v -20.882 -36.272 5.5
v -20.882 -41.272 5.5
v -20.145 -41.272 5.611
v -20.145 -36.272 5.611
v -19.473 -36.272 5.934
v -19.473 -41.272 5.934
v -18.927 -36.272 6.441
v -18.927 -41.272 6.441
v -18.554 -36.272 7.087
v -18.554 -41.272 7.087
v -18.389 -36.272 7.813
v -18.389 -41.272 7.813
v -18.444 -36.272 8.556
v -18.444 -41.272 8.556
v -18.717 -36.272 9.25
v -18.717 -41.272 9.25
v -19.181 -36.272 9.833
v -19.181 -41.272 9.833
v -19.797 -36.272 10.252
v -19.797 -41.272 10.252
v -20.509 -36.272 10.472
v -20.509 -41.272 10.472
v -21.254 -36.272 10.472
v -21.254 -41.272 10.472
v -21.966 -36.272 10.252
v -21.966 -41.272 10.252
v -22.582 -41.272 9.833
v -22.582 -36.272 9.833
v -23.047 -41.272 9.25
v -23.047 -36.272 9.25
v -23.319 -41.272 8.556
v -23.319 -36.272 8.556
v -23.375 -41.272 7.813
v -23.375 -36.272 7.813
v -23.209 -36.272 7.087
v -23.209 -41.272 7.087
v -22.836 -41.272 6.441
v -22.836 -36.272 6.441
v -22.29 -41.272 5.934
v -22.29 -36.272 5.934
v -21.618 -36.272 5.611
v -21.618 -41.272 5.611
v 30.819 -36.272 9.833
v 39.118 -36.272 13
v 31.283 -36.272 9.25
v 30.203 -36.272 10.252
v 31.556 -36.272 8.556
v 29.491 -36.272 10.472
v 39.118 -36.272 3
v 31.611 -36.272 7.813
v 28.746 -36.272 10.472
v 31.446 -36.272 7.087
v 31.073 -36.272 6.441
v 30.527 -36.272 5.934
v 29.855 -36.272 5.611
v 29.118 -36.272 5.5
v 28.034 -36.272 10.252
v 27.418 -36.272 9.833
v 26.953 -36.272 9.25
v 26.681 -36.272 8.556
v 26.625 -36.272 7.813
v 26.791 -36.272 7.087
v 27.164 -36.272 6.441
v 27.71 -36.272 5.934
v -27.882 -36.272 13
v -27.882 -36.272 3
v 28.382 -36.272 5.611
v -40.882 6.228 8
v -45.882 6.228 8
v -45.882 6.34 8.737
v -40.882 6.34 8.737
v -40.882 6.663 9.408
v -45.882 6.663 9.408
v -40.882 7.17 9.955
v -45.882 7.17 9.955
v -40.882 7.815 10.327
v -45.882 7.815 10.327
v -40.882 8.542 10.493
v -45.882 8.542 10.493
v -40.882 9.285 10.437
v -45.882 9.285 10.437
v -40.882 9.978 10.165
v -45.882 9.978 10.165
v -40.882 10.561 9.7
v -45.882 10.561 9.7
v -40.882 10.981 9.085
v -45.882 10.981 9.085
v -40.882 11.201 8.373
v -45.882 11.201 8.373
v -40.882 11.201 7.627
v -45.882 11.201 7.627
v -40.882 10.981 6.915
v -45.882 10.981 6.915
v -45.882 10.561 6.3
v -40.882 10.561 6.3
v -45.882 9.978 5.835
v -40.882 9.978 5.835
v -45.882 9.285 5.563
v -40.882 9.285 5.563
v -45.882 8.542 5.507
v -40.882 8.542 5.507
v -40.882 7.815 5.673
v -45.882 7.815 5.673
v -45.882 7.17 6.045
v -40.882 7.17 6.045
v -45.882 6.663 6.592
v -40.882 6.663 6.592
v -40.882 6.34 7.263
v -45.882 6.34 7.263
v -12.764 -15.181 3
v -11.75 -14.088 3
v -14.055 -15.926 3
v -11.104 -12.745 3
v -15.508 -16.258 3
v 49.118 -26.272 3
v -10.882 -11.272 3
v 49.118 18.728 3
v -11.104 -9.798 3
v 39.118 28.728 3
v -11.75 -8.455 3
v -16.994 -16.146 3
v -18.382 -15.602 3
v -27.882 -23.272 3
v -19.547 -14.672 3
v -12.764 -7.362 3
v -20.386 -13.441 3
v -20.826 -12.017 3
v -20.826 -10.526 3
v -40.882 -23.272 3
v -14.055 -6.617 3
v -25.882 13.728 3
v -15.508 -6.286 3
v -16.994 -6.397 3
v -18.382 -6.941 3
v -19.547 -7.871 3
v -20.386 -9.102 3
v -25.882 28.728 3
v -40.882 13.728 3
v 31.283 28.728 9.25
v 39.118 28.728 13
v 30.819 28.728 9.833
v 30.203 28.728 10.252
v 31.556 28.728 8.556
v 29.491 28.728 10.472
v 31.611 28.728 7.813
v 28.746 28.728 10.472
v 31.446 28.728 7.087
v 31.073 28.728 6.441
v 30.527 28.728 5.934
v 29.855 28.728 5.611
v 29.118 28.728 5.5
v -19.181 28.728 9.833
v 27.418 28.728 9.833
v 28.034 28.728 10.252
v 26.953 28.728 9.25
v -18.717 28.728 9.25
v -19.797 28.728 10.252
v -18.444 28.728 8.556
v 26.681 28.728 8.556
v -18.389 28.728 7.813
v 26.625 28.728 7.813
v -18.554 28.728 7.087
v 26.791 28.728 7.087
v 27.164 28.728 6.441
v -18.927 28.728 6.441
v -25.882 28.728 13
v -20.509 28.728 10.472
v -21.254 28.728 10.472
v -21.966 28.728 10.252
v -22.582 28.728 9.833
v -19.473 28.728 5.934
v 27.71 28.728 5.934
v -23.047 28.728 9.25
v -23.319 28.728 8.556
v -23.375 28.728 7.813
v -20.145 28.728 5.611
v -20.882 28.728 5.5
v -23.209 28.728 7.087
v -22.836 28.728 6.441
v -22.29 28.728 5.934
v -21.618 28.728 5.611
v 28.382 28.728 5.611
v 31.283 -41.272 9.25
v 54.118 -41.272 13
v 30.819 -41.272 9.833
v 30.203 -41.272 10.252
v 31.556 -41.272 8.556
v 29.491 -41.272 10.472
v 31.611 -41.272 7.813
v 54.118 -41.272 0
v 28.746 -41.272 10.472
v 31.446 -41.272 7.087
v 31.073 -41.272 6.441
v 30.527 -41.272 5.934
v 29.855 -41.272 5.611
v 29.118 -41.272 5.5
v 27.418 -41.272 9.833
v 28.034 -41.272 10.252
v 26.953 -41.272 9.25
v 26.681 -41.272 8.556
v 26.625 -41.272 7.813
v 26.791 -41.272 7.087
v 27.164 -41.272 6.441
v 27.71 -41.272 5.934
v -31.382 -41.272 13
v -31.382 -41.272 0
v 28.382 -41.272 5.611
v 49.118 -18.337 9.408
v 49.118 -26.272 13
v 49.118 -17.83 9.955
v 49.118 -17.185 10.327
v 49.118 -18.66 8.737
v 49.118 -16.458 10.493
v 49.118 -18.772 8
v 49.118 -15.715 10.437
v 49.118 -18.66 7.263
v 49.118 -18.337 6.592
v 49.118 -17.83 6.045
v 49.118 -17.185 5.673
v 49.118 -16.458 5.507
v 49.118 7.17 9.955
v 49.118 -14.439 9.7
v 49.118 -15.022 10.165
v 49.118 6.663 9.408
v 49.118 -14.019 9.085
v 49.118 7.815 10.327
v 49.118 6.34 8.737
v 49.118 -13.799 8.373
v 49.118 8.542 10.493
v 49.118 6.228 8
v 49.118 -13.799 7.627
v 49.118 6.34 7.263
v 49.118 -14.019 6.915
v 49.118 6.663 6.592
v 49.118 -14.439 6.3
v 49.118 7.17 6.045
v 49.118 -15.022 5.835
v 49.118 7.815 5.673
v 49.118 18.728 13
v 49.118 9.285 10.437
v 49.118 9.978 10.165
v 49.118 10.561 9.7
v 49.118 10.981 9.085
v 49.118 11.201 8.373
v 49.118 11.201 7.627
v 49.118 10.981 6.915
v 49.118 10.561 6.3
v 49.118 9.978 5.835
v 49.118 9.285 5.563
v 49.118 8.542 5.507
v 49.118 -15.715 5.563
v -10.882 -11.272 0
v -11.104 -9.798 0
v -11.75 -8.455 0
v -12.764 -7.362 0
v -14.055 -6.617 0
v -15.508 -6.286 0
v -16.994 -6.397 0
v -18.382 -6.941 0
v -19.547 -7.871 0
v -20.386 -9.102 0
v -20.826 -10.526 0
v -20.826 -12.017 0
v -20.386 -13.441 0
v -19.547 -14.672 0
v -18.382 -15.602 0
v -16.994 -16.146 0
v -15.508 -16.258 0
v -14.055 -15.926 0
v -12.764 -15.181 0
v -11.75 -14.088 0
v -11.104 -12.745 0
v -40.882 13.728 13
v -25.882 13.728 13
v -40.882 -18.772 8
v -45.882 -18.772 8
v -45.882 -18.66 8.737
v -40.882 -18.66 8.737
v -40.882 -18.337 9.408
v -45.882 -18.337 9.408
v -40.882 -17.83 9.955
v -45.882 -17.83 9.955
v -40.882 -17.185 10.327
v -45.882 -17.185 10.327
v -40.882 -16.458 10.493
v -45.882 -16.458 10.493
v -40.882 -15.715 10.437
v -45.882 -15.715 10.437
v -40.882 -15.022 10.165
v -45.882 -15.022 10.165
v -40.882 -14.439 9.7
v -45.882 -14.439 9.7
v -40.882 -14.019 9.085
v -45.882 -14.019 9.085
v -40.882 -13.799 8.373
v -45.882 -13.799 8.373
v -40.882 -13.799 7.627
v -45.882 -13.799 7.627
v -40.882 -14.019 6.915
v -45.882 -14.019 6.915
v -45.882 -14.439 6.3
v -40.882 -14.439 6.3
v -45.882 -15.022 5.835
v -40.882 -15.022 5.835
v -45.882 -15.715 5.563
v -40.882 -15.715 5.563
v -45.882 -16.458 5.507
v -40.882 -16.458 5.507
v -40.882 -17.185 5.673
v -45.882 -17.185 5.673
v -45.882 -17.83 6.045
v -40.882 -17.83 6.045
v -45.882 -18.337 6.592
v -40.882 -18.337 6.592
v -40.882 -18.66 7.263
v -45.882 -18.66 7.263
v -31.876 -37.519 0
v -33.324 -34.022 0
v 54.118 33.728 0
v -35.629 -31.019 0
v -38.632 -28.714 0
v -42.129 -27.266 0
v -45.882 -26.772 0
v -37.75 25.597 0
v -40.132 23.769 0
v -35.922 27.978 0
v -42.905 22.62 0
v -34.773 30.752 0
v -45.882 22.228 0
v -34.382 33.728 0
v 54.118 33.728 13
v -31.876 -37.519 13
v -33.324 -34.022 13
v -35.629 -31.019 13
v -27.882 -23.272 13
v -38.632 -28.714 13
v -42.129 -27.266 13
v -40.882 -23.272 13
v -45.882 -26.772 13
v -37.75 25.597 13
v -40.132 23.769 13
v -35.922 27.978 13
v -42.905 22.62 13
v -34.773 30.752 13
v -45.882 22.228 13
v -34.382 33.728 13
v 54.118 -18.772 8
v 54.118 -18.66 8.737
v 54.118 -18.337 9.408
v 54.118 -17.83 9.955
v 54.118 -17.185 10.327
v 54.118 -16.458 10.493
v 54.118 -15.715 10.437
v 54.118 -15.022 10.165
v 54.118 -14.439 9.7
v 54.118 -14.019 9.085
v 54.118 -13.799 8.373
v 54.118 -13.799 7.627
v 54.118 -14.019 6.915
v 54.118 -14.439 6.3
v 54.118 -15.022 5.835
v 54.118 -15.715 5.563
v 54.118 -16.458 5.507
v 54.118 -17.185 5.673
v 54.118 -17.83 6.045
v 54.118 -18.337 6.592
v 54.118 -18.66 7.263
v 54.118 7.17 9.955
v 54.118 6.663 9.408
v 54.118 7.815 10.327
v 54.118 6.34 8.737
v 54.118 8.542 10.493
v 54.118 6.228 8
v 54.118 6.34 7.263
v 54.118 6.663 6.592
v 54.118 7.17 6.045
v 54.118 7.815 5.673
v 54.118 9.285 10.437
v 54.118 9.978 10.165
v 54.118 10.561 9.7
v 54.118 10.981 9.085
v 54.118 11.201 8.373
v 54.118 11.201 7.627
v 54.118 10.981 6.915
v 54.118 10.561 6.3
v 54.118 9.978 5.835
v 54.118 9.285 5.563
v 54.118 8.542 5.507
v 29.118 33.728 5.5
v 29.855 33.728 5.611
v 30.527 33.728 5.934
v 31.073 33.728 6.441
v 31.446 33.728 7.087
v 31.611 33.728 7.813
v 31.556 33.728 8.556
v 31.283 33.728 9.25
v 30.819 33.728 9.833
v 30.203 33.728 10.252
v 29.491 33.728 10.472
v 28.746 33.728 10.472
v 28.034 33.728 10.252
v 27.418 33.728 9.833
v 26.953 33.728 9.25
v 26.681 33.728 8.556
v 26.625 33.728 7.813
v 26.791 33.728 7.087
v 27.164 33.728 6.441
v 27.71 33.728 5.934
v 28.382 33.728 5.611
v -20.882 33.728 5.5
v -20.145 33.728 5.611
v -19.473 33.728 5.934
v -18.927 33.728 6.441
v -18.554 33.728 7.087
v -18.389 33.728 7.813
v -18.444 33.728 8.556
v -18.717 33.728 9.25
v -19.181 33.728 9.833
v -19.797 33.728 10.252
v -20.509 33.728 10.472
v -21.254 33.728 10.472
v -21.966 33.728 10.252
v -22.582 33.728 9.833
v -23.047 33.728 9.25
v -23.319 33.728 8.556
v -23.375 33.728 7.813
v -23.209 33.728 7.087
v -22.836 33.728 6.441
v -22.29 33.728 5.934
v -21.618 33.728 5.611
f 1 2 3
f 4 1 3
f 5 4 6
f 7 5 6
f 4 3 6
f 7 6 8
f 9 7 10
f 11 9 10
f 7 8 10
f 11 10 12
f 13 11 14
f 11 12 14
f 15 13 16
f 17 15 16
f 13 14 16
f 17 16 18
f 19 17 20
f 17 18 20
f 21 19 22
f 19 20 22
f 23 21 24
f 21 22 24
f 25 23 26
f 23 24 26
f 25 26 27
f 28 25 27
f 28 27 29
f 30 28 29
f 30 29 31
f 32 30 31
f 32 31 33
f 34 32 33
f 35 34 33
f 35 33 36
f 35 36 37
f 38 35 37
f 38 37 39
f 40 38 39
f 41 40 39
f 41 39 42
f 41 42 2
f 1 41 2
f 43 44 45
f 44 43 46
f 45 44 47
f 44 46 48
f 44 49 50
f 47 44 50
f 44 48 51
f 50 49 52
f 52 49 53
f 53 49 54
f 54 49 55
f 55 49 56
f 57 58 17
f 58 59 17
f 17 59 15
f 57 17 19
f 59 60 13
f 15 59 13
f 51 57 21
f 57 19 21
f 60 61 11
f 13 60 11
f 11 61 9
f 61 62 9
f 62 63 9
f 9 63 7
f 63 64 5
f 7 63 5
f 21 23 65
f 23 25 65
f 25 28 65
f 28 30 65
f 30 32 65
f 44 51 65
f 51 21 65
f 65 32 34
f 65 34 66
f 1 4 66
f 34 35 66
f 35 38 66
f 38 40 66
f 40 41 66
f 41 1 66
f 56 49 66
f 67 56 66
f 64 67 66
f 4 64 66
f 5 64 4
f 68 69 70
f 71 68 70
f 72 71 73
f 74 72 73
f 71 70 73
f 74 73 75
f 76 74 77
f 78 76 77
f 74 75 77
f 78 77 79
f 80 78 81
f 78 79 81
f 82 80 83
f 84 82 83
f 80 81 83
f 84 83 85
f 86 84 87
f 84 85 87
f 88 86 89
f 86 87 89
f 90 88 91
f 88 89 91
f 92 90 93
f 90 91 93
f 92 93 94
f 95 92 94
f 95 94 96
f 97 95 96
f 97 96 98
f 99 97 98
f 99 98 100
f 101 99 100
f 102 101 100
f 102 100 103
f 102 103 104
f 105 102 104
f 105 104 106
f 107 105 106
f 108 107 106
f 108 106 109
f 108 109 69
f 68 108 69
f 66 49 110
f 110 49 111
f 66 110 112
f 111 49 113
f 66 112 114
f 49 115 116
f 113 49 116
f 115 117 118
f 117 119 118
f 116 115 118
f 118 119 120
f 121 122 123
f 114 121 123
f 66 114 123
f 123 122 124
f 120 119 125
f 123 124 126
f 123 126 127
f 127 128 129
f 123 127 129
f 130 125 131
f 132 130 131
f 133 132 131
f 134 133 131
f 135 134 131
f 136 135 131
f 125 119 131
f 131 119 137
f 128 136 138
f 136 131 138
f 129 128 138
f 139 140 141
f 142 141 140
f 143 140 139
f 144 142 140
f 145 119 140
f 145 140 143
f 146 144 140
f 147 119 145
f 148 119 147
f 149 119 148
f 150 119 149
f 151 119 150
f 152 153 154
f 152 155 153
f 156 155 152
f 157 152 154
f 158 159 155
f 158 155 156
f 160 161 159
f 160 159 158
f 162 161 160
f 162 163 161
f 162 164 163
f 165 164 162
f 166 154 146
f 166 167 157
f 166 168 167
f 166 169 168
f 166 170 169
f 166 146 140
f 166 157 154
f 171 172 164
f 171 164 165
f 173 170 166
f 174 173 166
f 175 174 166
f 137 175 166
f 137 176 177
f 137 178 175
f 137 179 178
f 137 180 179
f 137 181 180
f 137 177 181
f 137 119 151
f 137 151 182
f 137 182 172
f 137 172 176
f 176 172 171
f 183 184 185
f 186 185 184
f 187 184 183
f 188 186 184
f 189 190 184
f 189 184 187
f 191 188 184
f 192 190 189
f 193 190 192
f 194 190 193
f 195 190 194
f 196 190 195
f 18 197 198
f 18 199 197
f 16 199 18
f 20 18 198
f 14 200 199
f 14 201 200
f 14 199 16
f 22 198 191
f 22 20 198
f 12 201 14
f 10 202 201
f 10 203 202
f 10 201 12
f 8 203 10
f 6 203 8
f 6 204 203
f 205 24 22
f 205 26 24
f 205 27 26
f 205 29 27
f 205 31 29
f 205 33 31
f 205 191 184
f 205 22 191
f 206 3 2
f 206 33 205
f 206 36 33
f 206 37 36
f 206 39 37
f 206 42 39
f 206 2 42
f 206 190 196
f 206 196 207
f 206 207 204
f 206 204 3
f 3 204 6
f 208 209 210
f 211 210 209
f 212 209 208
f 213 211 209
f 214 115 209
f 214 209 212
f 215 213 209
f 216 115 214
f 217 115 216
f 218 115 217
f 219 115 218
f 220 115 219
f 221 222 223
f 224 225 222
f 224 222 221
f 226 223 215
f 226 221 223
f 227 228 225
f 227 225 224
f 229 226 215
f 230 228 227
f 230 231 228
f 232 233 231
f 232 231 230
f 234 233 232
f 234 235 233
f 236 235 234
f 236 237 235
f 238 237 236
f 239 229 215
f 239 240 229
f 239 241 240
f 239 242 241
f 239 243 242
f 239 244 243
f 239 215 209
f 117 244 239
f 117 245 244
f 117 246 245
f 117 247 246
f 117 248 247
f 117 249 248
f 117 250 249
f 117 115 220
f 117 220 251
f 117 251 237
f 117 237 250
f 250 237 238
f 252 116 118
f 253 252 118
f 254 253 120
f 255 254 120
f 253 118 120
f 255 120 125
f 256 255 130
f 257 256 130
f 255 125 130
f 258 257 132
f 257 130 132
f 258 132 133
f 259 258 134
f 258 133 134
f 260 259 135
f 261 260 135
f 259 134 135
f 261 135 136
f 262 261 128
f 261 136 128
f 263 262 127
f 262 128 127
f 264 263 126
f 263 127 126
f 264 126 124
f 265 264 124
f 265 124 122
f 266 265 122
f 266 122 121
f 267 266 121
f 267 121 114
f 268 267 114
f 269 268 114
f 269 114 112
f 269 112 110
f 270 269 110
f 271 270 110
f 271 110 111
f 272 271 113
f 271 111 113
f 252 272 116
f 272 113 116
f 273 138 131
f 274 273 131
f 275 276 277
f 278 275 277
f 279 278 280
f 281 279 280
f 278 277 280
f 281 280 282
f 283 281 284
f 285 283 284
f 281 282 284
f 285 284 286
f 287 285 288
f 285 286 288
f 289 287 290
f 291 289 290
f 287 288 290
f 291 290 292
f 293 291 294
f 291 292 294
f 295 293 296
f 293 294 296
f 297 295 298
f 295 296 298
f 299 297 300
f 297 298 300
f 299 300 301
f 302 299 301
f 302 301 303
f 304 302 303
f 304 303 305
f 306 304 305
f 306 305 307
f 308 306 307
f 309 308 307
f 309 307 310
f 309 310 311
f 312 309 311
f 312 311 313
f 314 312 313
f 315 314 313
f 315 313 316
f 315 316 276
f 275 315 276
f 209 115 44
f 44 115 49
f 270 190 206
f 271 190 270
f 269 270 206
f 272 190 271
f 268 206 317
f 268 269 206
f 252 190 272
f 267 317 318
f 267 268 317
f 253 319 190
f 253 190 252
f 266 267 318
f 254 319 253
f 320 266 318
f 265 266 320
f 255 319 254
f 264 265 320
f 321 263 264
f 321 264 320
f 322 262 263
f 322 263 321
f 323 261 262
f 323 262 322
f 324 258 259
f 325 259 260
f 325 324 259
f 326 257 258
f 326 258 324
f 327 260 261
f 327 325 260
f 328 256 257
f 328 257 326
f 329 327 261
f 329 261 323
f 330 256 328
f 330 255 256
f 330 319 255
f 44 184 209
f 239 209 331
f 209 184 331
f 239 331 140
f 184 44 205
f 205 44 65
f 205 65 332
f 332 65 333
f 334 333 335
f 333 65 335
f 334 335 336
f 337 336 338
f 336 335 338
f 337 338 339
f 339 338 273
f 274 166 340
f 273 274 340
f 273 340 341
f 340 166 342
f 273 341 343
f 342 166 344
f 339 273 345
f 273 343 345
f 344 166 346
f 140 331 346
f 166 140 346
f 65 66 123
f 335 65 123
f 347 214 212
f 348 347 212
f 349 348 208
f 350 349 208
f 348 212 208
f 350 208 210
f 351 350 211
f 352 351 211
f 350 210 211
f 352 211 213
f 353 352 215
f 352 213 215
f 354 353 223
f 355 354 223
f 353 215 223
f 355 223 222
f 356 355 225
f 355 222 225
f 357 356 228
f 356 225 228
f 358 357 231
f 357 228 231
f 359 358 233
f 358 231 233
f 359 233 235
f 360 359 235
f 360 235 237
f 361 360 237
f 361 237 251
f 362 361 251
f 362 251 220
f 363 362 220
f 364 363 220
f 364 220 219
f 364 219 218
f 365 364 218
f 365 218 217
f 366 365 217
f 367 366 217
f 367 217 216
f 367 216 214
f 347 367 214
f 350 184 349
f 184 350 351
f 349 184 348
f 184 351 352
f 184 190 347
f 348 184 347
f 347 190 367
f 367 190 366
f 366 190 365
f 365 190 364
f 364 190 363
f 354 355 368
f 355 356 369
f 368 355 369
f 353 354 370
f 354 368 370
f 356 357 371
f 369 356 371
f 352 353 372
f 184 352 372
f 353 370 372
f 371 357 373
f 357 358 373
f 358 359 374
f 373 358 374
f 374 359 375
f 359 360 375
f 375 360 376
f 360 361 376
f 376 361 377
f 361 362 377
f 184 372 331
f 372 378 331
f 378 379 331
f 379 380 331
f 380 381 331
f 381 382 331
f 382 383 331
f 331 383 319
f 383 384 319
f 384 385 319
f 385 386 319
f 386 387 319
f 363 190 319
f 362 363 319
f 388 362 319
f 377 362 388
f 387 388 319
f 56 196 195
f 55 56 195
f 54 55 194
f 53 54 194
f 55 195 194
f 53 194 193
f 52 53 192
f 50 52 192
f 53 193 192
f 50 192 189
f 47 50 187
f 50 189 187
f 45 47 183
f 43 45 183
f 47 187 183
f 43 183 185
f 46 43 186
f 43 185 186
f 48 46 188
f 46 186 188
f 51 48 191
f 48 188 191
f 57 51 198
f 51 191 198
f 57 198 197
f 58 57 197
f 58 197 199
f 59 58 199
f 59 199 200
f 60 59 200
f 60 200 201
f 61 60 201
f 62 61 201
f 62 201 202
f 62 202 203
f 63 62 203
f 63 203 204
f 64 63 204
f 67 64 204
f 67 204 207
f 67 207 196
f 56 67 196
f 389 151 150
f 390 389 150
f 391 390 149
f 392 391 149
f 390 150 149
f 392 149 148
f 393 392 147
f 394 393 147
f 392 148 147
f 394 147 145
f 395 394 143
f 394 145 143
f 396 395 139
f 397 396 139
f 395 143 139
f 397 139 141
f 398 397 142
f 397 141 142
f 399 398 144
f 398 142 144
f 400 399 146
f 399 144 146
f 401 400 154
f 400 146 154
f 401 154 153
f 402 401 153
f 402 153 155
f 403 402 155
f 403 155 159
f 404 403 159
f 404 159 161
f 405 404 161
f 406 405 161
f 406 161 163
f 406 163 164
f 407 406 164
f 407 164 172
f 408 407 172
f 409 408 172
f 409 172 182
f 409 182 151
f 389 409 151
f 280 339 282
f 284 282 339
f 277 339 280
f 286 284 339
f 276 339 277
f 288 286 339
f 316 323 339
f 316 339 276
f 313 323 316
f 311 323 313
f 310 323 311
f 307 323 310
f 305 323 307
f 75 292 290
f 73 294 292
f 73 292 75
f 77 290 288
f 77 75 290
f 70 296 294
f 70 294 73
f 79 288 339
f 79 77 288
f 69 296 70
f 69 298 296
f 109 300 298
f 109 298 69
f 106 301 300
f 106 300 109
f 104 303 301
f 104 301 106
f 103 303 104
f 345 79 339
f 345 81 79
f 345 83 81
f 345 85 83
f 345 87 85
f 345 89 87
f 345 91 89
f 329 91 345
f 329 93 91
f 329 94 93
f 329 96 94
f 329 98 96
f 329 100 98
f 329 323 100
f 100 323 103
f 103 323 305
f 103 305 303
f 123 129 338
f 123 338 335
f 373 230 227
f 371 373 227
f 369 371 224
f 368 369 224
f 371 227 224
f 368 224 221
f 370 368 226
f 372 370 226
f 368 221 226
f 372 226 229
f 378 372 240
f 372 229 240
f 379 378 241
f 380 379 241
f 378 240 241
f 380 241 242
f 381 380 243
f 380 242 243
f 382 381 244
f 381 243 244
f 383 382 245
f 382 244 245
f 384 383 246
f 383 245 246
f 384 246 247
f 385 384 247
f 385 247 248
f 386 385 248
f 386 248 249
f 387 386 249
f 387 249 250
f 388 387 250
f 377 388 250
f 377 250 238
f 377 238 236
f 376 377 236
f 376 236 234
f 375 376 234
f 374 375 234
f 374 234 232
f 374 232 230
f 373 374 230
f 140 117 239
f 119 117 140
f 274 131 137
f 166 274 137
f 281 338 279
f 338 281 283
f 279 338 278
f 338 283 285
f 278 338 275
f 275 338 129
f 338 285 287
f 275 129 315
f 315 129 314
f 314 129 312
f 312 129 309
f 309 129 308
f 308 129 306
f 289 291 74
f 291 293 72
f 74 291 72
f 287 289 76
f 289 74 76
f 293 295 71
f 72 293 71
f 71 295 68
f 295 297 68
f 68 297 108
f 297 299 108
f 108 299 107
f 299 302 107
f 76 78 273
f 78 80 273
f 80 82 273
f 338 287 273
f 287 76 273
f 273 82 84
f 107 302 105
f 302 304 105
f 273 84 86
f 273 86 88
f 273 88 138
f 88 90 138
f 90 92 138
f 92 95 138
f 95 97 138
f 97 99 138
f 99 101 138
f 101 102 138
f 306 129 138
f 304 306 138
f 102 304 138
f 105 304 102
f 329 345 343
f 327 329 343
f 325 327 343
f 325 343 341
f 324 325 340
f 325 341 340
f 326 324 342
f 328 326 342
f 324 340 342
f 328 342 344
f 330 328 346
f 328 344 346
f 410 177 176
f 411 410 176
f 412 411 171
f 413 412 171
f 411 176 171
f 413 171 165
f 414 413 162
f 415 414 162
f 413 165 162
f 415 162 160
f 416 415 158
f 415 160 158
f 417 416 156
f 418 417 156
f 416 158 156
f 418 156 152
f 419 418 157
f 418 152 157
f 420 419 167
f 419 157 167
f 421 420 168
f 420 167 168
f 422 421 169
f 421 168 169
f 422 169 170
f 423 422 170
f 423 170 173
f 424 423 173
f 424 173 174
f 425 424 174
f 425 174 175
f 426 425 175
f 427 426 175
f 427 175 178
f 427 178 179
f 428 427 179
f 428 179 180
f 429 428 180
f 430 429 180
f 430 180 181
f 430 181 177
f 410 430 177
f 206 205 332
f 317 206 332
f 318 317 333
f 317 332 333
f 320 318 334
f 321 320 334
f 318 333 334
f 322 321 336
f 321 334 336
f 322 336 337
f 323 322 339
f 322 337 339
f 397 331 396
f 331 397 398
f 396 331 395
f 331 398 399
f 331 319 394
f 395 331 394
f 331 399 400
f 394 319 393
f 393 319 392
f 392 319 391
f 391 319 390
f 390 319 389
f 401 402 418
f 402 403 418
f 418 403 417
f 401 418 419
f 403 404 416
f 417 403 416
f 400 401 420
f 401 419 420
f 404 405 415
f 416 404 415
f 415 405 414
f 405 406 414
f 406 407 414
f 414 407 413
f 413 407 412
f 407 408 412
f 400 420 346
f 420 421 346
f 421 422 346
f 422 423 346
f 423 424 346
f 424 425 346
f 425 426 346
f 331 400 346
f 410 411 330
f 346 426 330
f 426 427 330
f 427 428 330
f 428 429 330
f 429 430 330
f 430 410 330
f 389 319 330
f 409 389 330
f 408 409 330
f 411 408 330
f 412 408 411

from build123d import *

# Parameters (mm, degrees)
BOSS_EXTRU_1_DEPTH        = 13
COQUE1_T                  = -5
COQUE1_THICKNESS_2_FACE_W = 90
COQUE1_THICKNESS_2_FACE_H = 65
COQUE1_THICKNESS_2_DEPTH  = 2
ENL_V_MAT_EXTRU_1_REACH   = 110.96
ESQUISSE2_R               = 2.5
ENL_V_MAT_EXTRU_2_REACH   = 95.396
ESQUISSE3_R               = 2.5
ESQUISSE4_W               = 18
ESQUISSE4_H               = 18
ESQUISSE4_W_2             = 15
ESQUISSE4_H_2             = 15
BOSS_EXTRU_2_DEPTH        = 10
ESQUISSE6_R               = 11.5
ESQUISSE6_R_2             = 14.5
ENL_V_MAT_EXTRU_4_DEPTH   = 13
ESQUISSE7_R               = 5
ENL_V_MAT_EXTRU_5_DEPTH   = 3


with BuildPart() as part:
    # Esquisse1 → Boss.-Extru.1 (new body)
    with BuildSketch(Plane.XY):
        Polygon((44.118436308, 33.728448276), (54.118436308, 33.728448276), (54.118436308, 23.728448276), (54.118436308, -41.271551724), (-45.881563692, -41.271551724), (-45.881563692, 33.728448276), align=None)
    extrude(amount=BOSS_EXTRU_1_DEPTH)

    # Coque1
    coque1_openings = [part.faces().sort_by_distance(p)[0] for p in [
        (4.118436308, -3.771551724, 13),
    ]]
    offset(amount=COQUE1_T, openings=coque1_openings, kind=Kind.INTERSECTION)

    # Coque1 thickness 2 face (on inner face of the shell) → Coque1 thickness 2 (cut)
    with BuildSketch(Plane(origin=(4.118436308, -3.771551724, 5), x_dir=(-1, 0, 0), z_dir=(0, 0, -1))):
        Rectangle(COQUE1_THICKNESS_2_FACE_W, COQUE1_THICKNESS_2_FACE_H)
    extrude(amount=COQUE1_THICKNESS_2_DEPTH, mode=Mode.SUBTRACT)

    # Enlèv. mat.-Extru.1: up to this face of the body (flat: up to its plane)
    enl_v_mat_extru_1_end = Plane(part.part.faces().sort_by_distance((54.118436308, -3.771551724, 6.5))[0])
    # Esquisse2 → Enlèv. mat.-Extru.1 (cut, up to the picked face)
    with BuildSketch(Plane.ZY.offset(45.881563692), mode=Mode.PRIVATE) as enl_v_mat_extru_1_sk1:
        with Locations(Location((8, -16.271551724, 0), (0, 0, 270))):
            Circle(ESQUISSE2_R)
    enl_v_mat_extru_1_tool1 = split(extrude(enl_v_mat_extru_1_sk1.sketch, amount=-ENL_V_MAT_EXTRU_1_REACH, mode=Mode.PRIVATE), bisect_by=enl_v_mat_extru_1_end, keep=Keep.BOTH, mode=Mode.PRIVATE)
    # Esquisse2 → Enlèv. mat.-Extru.1 (cut, up to the picked face)
    with BuildSketch(Plane.ZY.offset(45.881563692), mode=Mode.PRIVATE) as enl_v_mat_extru_1_sk2:
        with Locations(Location((8, 8.728448276, 0), (0, 0, 270))):
            Circle(ESQUISSE2_R)
    enl_v_mat_extru_1_tool2 = split(extrude(enl_v_mat_extru_1_sk2.sketch, amount=-ENL_V_MAT_EXTRU_1_REACH, mode=Mode.PRIVATE), bisect_by=enl_v_mat_extru_1_end, keep=Keep.BOTH, mode=Mode.PRIVATE)
    add(enl_v_mat_extru_1_tool1.solids().sort_by(Axis((-45.881564, -16.271552, 8), (1, 0, 0)))[0], mode=Mode.SUBTRACT)
    add(enl_v_mat_extru_1_tool2.solids().sort_by(Axis((-45.881564, 8.728448, 8), (1, 0, 0)))[0], mode=Mode.SUBTRACT)

    # Enlèv. mat.-Extru.2: up to this face of the body (flat: up to its plane)
    enl_v_mat_extru_2_end = Plane(part.part.faces().sort_by_distance((4.118436308, 33.728448276, 6.5))[0])
    # Esquisse3 → Enlèv. mat.-Extru.2 (cut, up to the picked face)
    with BuildSketch(Plane.XZ.offset(41.271551724), mode=Mode.PRIVATE) as enl_v_mat_extru_2_sk1:
        with Locations(Location((-20.881563692, 8, 0), (0, 0, 270))):
            Circle(ESQUISSE3_R)
    enl_v_mat_extru_2_tool1 = split(extrude(enl_v_mat_extru_2_sk1.sketch, amount=-ENL_V_MAT_EXTRU_2_REACH, mode=Mode.PRIVATE), bisect_by=enl_v_mat_extru_2_end, keep=Keep.BOTH, mode=Mode.PRIVATE)
    # Esquisse3 → Enlèv. mat.-Extru.2 (cut, up to the picked face)
    with BuildSketch(Plane.XZ.offset(41.271551724), mode=Mode.PRIVATE) as enl_v_mat_extru_2_sk2:
        with Locations(Location((29.118436308, 8, 0), (0, 0, 270))):
            Circle(ESQUISSE3_R)
    enl_v_mat_extru_2_tool2 = split(extrude(enl_v_mat_extru_2_sk2.sketch, amount=-ENL_V_MAT_EXTRU_2_REACH, mode=Mode.PRIVATE), bisect_by=enl_v_mat_extru_2_end, keep=Keep.BOTH, mode=Mode.PRIVATE)
    add(enl_v_mat_extru_2_tool1.solids().sort_by(Axis((-20.881564, -41.271552, 8), (0, 1, 0)))[0], mode=Mode.SUBTRACT)
    add(enl_v_mat_extru_2_tool2.solids().sort_by(Axis((29.118436, -41.271552, 8), (0, 1, 0)))[0], mode=Mode.SUBTRACT)

    # Esquisse4 → Boss.-Extru.2 (add)
    with BuildSketch(Plane.XY.offset(3)):
        with Locations((-36.881563692, -32.271551724)):
            Rectangle(ESQUISSE4_W, ESQUISSE4_H)
        Polygon((49.118436308, 28.728448276), (49.118436308, 18.728448276), (39.118436308, 28.728448276), align=None)
        Polygon((49.118436308, -36.271551724), (49.118436308, -26.271551724), (39.118436308, -36.271551724), align=None)
        with Locations((-33.381563692, 21.228448276)):
            Rectangle(ESQUISSE4_W_2, ESQUISSE4_H_2)
    extrude(amount=BOSS_EXTRU_2_DEPTH)

    # Esquisse6 → Enlèv. mat.-Extru.4 (cut)
    with BuildSketch(Plane.XY.offset(13)):
        with Locations((-45.881563692, 33.728448276)):
            Circle(ESQUISSE6_R)
        with Locations((-45.881563692, -41.271551724)):
            Circle(ESQUISSE6_R_2)
    extrude(amount=-ENL_V_MAT_EXTRU_4_DEPTH, mode=Mode.SUBTRACT)

    # Esquisse7 → Enlèv. mat.-Extru.5 (cut)
    with BuildSketch(Plane.XY.offset(3)):
        with Locations((-15.881563692, -11.271551724)):
            Circle(ESQUISSE7_R)
    extrude(amount=-ENL_V_MAT_EXTRU_5_DEPTH, mode=Mode.SUBTRACT)


solid = part.part
